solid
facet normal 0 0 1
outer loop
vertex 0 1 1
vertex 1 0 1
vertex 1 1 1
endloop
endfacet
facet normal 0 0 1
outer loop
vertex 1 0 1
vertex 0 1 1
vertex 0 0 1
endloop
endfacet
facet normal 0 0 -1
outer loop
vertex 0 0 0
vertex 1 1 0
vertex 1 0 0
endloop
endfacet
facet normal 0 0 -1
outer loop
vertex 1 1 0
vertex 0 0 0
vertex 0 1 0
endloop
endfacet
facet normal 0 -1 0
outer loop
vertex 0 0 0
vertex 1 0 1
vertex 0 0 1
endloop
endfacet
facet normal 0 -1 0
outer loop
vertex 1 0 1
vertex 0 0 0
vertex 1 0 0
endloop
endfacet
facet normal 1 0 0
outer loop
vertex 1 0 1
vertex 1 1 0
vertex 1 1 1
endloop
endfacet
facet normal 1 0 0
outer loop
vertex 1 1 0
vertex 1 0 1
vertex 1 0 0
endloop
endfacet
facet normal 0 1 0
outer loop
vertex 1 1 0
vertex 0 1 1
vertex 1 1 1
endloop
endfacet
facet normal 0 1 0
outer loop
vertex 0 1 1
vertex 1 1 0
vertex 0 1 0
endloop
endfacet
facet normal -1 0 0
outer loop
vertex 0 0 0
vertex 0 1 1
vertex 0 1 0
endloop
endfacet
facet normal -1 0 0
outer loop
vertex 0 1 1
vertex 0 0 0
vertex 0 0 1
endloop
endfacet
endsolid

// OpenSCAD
a = 1;
cube(a); // geometry does not end the parameter list
b = 2;
c = "pie"; // [a:Apple pie, pie:Pie, plain]
d = 5; // 10
e = 2; // [0.5:2.5]
f = 7; // [ 5 ]
g = 1.25; // [0:0.25:2]  trailing text after the spec cancels it
// line one
// line two
h = 3;
i = 4; /* [Group in block after param] */
j = 5;
function fn() = 1;
l = 6; // a function does not end the parameter list
